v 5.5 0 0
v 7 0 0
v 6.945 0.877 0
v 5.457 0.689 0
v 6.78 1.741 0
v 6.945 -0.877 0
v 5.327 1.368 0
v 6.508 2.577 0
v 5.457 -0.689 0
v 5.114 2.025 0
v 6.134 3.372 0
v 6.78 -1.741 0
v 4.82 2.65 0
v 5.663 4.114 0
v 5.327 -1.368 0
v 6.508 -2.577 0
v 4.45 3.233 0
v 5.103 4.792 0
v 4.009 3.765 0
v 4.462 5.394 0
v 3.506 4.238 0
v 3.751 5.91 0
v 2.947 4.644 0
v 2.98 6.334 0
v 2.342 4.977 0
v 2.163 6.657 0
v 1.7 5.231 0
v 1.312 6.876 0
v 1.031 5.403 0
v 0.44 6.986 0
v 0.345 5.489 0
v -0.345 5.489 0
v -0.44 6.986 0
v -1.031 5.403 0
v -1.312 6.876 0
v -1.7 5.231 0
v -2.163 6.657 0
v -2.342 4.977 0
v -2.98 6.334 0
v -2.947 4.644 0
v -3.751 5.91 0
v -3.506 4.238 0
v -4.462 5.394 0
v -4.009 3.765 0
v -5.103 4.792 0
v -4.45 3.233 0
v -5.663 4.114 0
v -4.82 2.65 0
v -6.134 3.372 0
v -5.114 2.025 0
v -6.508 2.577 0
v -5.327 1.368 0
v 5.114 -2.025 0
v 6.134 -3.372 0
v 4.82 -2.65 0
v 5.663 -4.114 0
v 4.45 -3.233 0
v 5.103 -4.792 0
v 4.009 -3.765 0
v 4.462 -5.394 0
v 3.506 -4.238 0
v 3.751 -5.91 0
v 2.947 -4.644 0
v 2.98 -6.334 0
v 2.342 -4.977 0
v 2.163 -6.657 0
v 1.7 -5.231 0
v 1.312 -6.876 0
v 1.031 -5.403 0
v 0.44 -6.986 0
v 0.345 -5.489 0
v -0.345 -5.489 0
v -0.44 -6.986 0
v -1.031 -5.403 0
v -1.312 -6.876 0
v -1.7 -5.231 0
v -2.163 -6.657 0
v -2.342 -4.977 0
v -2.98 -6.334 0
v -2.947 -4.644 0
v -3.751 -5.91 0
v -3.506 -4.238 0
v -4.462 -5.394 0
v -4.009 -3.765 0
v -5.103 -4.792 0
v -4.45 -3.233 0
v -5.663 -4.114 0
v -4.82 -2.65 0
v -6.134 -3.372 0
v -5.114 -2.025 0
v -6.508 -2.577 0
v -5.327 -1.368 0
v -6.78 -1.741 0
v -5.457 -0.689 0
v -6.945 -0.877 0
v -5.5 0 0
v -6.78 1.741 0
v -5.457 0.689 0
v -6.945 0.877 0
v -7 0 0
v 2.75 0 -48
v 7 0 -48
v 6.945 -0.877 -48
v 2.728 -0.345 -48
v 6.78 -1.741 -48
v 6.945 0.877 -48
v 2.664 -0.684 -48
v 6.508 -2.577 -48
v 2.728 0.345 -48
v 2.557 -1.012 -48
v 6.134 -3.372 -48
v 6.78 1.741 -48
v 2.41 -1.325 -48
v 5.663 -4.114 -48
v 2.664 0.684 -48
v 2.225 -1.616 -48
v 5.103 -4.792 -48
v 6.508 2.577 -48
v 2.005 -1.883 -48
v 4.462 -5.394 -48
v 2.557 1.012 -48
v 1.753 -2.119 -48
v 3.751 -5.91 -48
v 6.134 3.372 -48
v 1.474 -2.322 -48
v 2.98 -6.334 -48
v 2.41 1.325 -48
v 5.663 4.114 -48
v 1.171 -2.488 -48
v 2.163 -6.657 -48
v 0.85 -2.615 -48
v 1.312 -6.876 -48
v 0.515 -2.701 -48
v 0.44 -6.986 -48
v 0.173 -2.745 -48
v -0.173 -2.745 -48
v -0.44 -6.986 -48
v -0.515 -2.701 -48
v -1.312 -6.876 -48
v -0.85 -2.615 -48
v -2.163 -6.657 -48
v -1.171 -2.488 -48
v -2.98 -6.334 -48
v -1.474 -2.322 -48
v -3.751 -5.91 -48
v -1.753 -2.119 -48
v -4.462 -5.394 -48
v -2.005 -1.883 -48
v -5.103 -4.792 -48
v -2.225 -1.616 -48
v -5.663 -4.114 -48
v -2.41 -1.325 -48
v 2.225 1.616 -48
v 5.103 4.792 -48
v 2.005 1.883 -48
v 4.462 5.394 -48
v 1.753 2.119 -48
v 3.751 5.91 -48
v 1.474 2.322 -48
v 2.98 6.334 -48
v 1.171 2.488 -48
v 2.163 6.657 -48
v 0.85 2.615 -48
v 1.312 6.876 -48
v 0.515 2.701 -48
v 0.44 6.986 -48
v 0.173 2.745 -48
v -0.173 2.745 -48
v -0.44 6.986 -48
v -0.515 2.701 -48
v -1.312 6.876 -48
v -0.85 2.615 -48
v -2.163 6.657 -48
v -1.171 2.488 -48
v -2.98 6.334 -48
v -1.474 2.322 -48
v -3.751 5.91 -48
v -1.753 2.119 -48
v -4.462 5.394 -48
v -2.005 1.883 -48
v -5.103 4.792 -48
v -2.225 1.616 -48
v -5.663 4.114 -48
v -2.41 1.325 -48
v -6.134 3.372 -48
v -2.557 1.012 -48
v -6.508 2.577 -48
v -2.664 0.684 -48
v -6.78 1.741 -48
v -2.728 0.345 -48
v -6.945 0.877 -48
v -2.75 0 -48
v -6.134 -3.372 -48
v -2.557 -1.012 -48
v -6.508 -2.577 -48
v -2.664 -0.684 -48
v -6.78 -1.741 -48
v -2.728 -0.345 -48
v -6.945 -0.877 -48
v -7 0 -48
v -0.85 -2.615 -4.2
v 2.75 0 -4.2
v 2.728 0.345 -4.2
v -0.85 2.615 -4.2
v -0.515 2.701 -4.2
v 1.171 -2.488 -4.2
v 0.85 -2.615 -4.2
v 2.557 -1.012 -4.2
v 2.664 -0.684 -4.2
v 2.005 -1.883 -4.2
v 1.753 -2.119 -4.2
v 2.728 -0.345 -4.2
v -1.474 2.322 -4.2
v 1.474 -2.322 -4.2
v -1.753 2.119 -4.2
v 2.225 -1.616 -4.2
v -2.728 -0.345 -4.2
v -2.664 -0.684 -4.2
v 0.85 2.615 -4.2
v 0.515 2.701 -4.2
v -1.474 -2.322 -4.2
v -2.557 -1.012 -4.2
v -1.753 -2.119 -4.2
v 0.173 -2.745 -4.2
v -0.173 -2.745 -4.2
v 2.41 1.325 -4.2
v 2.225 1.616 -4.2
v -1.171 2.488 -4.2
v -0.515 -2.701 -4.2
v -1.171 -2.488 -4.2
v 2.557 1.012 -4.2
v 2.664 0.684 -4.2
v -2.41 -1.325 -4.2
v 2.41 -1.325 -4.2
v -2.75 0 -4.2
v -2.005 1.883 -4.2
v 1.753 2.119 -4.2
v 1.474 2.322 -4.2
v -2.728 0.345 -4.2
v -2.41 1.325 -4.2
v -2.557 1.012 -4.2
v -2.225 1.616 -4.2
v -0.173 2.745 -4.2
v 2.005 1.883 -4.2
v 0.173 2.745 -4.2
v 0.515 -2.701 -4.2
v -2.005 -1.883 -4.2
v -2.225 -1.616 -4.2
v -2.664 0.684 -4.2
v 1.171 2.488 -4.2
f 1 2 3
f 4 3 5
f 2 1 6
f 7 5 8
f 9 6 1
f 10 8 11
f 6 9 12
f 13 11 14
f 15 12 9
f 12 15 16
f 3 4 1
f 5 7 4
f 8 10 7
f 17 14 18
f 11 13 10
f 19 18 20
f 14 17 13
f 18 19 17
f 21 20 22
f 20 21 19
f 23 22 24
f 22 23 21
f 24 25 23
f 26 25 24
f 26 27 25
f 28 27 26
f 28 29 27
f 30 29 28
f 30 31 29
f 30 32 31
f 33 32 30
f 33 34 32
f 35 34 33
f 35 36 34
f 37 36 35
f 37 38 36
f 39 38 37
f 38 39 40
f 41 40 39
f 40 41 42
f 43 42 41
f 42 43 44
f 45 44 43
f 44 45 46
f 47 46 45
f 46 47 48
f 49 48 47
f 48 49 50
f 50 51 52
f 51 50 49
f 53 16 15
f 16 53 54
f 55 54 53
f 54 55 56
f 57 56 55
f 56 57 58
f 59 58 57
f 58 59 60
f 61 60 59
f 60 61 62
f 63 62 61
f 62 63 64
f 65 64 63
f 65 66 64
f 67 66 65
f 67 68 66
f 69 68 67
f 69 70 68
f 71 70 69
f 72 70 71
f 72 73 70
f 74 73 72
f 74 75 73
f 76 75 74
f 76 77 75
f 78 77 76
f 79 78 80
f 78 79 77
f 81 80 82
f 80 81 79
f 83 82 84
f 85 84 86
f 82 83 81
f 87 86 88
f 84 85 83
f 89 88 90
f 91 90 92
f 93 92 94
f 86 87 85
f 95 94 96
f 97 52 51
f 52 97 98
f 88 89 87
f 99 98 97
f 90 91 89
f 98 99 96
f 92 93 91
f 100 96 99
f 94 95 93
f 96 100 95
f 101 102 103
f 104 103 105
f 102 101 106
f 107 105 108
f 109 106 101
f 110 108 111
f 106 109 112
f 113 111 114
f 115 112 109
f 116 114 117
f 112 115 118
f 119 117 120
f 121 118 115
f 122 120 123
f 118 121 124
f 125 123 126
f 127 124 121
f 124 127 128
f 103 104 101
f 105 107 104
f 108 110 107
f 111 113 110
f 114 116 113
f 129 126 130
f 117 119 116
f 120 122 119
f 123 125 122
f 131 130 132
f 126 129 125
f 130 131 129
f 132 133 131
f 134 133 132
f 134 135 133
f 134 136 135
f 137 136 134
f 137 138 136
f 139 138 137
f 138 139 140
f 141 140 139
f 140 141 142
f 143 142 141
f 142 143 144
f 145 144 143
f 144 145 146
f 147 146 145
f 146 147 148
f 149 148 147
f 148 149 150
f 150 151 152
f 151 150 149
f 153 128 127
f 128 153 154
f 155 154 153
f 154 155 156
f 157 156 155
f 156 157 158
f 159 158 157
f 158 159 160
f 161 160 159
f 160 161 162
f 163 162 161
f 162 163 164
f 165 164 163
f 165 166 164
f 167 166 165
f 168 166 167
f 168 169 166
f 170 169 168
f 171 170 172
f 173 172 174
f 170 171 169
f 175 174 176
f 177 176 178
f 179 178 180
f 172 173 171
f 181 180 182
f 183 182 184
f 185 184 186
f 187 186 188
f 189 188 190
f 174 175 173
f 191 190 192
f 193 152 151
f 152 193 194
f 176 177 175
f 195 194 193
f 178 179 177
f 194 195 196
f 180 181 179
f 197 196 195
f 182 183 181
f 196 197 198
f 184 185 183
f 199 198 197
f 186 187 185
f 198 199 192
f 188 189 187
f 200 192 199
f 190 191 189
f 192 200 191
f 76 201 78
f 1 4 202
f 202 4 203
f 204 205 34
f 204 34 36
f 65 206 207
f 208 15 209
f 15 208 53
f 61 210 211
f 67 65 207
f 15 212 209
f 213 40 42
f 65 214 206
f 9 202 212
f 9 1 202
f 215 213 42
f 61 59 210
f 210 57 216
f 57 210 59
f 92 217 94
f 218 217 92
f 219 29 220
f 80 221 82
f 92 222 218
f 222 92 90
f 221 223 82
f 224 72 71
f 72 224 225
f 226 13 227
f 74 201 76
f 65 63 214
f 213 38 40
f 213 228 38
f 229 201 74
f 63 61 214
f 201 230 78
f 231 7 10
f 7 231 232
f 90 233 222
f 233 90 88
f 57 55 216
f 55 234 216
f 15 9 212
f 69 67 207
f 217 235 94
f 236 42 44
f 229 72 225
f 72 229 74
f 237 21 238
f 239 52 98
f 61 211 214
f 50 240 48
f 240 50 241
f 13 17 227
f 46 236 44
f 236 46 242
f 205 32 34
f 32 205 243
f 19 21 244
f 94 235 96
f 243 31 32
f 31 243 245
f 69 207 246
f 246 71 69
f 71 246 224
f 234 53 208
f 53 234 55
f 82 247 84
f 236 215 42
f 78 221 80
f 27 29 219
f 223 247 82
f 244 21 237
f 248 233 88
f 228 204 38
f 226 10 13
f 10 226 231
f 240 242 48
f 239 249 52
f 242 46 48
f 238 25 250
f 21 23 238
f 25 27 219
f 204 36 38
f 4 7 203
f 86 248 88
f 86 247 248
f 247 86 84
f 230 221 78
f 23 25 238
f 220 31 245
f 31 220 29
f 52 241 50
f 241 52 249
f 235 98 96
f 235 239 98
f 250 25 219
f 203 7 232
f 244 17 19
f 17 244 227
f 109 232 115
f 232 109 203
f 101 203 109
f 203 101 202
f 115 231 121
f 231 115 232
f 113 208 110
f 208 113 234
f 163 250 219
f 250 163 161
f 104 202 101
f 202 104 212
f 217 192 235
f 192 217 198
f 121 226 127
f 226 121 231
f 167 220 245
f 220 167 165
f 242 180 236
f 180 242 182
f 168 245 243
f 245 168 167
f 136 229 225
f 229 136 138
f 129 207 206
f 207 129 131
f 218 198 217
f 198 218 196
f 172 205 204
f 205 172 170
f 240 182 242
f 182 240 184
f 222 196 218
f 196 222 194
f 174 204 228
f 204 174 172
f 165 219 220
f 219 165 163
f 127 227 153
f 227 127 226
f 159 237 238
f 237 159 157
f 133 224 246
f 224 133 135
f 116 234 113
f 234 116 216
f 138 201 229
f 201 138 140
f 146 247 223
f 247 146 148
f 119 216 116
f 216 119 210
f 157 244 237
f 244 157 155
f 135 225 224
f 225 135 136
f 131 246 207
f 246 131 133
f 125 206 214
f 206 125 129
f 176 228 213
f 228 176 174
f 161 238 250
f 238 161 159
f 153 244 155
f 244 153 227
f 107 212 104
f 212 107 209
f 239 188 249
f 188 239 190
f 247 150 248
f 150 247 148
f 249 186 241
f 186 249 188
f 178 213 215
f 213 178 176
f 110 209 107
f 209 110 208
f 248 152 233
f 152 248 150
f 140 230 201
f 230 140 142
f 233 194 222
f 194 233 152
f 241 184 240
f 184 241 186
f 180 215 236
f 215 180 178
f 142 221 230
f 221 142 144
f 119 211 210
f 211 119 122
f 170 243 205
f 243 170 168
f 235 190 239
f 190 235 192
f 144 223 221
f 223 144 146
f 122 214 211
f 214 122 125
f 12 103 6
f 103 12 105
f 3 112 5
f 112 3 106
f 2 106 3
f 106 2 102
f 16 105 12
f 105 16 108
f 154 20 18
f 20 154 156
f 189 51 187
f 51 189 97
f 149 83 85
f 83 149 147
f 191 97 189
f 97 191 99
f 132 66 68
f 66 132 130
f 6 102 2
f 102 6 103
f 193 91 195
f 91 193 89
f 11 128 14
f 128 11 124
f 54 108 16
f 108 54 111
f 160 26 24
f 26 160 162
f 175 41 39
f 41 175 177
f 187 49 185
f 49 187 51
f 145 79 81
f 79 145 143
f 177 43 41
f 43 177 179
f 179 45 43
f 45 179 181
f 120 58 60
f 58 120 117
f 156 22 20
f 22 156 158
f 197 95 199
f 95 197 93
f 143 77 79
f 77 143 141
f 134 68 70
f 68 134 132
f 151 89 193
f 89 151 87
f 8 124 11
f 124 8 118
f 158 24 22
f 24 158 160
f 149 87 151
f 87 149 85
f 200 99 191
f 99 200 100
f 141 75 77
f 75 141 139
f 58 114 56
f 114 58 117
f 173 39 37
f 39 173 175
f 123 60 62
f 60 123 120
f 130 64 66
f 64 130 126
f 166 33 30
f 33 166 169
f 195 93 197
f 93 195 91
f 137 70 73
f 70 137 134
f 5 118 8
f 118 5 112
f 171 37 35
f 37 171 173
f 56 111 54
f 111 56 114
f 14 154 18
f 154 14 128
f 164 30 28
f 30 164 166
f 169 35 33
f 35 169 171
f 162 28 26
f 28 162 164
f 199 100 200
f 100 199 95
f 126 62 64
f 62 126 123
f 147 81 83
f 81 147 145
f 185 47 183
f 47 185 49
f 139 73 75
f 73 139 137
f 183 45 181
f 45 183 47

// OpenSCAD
$fn = 50;


difference() {
	union() {
		translate(v = [0, 0, -48.0000000000]) {
			cylinder(h = 48, r = 7.0000000000);
		}
		cylinder(h = 0, r = 10.0000000000);
	}
	union() {
		translate(v = [0, 0, 0]) {
			rotate(a = [0, 0, 0]) {
				difference() {
					union() {
						#translate(v = [0, 0, -48.0000000000]) {
							cylinder(h = 48, r = 2.2500000000);
						}
						#translate(v = [0, 0, -4.2000000000]) {
							cylinder(h = 4.2000000000, r = 7.0000000000, r1 = 2.7500000000, r2 = 5.5000000000);
						}
						#translate(v = [0, 0, -48.0000000000]) {
							cylinder(h = 48, r = 2.7500000000);
						}
						#translate(v = [0, 0, -48.0000000000]) {
							cylinder(h = 48, r = 2.2500000000);
						}
					}
					union();
				}
			}
		}
	}
}
